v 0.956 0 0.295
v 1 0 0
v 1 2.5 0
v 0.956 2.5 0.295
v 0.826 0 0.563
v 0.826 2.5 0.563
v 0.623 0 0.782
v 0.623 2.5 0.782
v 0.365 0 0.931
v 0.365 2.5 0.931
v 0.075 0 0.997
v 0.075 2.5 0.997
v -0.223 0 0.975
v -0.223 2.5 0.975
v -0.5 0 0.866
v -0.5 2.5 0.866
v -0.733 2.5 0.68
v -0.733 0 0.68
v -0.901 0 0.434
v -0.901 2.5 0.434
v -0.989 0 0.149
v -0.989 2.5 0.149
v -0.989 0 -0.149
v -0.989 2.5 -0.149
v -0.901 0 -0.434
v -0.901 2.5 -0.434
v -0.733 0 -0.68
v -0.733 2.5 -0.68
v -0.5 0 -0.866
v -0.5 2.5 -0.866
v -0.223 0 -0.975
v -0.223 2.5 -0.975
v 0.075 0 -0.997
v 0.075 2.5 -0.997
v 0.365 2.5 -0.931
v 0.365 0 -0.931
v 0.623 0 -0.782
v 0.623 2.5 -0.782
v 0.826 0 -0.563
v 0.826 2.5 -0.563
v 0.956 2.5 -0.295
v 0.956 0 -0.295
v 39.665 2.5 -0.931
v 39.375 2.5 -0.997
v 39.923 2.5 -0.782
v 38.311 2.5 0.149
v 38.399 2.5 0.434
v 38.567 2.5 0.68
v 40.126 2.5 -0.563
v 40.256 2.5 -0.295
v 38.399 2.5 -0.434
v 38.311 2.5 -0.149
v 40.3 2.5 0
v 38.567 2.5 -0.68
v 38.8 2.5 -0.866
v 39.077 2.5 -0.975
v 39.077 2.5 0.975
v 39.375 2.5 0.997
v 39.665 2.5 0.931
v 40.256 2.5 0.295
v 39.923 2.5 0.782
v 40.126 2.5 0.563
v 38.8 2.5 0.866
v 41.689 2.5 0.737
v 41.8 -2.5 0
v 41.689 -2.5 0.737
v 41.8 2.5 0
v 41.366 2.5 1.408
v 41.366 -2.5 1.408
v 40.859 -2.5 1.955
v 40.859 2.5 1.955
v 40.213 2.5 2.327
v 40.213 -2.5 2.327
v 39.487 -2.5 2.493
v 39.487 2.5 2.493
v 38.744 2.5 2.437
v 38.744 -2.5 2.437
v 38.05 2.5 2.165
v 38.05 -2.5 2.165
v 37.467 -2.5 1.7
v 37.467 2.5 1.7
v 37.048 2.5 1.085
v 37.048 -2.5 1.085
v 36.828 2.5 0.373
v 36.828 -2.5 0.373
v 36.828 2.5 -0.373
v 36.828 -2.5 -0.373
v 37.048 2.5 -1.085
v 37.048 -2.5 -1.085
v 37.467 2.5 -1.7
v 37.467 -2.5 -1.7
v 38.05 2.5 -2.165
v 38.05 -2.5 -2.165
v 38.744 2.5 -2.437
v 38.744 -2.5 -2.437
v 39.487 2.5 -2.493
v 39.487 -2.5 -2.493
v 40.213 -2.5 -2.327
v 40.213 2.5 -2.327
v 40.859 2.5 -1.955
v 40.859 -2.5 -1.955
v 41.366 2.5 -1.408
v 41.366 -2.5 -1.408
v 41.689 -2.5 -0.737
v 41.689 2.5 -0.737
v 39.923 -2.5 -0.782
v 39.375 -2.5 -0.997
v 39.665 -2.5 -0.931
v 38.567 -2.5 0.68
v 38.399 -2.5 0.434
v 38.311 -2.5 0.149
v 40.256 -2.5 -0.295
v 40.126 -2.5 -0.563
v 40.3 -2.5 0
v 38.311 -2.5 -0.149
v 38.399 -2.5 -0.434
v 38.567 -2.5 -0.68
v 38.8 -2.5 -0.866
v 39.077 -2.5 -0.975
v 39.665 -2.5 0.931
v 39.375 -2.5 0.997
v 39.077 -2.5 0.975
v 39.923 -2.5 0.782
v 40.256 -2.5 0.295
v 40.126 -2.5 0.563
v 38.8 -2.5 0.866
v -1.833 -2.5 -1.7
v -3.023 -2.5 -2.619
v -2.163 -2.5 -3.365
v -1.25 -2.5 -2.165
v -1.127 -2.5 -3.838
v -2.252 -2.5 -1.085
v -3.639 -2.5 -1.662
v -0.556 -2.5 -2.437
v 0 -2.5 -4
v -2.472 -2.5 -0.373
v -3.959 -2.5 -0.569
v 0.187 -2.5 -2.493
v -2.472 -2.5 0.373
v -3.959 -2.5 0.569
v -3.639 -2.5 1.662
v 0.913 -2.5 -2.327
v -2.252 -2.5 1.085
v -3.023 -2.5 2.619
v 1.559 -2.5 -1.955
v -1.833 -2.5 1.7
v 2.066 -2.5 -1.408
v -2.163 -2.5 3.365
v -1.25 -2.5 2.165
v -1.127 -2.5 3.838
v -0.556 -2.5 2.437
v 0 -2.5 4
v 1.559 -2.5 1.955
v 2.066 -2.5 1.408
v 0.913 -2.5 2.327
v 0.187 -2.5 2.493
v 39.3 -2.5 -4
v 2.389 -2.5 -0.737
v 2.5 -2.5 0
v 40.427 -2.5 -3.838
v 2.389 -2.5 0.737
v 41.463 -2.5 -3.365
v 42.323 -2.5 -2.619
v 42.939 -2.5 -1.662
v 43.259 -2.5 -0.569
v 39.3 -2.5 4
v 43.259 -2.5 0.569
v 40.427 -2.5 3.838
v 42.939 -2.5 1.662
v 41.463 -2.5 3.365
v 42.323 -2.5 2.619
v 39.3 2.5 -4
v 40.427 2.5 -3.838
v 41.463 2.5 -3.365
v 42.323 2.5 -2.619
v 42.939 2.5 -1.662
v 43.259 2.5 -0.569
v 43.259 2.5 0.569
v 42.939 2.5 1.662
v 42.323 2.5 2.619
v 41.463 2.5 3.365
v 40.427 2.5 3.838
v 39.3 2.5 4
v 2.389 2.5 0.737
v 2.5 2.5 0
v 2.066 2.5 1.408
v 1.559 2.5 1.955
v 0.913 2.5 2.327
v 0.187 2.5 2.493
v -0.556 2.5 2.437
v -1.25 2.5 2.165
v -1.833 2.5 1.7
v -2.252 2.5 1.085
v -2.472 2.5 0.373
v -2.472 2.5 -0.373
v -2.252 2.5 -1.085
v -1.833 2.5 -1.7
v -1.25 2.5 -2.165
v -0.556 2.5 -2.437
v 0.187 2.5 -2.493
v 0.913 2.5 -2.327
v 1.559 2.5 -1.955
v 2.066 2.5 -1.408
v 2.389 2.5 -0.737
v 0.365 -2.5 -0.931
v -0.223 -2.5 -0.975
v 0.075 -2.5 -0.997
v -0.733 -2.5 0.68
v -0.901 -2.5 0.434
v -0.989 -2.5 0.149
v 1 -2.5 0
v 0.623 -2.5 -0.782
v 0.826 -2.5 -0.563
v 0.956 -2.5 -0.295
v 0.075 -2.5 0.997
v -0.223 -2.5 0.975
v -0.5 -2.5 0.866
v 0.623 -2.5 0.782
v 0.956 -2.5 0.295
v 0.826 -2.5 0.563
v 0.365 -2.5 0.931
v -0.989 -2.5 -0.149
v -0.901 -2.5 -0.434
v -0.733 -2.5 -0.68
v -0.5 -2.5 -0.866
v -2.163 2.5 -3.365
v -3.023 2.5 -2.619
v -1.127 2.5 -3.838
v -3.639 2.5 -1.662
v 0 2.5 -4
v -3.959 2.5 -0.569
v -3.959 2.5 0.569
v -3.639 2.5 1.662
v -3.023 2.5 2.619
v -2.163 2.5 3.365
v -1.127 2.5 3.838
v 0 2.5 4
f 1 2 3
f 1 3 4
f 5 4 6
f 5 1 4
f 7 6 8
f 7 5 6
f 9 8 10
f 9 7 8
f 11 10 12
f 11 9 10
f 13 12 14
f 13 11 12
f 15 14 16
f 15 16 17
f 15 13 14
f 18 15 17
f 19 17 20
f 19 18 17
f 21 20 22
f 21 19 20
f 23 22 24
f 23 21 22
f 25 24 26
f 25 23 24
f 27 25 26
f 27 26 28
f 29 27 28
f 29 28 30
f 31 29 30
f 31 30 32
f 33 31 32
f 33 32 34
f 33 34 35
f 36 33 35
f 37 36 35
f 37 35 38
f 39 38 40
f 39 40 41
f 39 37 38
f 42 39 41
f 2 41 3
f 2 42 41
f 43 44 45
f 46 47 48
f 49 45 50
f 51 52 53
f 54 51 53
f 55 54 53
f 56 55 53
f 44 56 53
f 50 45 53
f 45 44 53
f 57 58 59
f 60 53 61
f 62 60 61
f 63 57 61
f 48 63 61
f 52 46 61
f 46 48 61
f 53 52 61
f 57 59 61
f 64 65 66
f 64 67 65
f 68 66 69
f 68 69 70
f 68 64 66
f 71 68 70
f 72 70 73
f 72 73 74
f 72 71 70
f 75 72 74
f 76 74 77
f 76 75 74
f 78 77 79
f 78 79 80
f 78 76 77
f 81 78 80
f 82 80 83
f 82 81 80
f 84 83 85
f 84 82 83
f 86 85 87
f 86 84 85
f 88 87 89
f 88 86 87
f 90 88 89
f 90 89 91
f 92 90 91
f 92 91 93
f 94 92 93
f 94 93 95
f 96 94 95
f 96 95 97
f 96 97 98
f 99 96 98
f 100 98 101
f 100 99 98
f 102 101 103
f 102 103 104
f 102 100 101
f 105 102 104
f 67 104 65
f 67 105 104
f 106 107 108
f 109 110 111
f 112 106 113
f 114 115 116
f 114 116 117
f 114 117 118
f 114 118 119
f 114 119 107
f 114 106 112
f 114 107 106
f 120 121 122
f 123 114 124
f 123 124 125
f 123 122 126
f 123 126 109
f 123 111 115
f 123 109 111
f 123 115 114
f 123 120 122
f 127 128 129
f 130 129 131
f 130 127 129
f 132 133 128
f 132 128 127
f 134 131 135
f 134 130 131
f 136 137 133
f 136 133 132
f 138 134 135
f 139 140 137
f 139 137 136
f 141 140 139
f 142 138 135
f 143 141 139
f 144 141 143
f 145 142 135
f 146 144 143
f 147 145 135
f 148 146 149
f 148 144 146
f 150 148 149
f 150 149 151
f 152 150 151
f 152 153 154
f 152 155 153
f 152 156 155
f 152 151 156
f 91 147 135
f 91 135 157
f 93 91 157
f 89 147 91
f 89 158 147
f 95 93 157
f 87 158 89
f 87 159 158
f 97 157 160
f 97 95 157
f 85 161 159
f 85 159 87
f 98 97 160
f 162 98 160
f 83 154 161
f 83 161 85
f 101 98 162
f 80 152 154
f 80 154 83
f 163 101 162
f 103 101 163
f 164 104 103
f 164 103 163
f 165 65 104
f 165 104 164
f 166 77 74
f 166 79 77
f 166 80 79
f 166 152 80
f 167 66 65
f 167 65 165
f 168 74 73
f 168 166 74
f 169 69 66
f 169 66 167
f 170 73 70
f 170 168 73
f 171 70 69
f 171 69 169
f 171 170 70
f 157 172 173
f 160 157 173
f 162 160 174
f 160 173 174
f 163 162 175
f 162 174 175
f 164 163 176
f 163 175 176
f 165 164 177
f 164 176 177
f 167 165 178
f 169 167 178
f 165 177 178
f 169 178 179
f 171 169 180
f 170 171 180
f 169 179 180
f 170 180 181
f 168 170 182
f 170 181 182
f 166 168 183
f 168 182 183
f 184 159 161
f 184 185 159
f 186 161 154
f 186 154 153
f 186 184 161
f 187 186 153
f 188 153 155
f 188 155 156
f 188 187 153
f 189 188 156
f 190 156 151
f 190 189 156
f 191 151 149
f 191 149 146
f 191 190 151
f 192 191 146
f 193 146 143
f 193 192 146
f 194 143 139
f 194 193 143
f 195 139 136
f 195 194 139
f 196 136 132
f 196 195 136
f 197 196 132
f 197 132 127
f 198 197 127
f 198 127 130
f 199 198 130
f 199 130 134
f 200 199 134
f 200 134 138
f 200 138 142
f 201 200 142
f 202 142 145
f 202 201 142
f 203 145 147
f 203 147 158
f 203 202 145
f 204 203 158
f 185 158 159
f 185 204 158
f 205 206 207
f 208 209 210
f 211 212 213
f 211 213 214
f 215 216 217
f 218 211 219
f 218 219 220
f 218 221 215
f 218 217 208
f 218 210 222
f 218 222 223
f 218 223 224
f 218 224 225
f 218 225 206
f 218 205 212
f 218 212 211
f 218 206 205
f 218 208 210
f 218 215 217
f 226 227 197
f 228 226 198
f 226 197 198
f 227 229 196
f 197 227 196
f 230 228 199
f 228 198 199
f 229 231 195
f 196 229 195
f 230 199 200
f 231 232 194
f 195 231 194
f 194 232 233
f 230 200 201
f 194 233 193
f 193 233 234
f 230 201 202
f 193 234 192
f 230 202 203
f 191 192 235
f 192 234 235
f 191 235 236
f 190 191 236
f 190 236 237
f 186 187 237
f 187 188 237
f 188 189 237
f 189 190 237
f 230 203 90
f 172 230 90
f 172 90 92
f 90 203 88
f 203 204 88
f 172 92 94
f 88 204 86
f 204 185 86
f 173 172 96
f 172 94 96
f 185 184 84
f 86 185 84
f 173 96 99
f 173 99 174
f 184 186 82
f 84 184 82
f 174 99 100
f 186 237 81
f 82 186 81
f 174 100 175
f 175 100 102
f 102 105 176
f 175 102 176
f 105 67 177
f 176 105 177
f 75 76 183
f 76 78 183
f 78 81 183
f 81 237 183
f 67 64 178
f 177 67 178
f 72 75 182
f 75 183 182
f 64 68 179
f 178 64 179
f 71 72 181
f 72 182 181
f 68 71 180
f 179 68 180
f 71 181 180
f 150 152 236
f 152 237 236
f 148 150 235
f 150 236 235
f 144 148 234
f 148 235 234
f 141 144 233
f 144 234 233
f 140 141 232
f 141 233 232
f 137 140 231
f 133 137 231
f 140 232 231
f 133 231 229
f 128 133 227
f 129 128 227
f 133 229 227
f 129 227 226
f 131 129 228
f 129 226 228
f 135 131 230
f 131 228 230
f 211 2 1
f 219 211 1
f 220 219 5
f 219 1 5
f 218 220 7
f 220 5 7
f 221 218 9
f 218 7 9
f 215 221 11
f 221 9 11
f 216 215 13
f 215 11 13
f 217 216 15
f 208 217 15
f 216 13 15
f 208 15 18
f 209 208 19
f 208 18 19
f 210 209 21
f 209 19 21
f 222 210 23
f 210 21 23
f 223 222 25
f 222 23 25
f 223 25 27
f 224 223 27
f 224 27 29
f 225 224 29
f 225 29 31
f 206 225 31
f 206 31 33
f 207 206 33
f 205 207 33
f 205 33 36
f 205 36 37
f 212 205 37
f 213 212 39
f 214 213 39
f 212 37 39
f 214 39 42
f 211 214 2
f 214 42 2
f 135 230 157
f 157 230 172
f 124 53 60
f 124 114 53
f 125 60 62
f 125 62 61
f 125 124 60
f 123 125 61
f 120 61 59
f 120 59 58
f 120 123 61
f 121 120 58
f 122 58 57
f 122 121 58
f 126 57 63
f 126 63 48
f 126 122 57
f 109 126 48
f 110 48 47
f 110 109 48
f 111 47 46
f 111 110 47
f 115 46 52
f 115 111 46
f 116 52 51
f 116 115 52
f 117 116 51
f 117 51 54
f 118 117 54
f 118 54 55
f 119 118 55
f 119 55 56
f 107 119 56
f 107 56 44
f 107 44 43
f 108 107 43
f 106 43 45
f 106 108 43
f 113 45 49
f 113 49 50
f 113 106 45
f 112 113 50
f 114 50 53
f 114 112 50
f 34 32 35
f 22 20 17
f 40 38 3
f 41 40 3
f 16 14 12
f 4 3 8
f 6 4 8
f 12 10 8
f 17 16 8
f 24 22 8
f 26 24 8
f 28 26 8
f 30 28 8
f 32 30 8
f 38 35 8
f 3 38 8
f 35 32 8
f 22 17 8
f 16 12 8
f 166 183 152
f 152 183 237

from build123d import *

# Parameters (mm, degrees)
F0_R     = 2.5
F0_R_2   = 1
F1_DEPTH = 2.5


with BuildPart() as f1:
    # F0 (on Front) → F1 (new body, symmetric)
    with BuildSketch(Plane.XZ):
        with BuildLine():
            Line((39.3, 4), (0, 4))
            ThreePointArc((0, 4), (-4, 0), (0, -4))
            Line((0, -4), (39.3, -4))
            ThreePointArc((39.3, -4), (43.3, 0), (39.3, 4))
        make_face()
        Circle(F0_R, mode=Mode.SUBTRACT)
        with Locations((39.3, 0)):
            Circle(F0_R, mode=Mode.SUBTRACT)
        Circle(F0_R_2)
        with Locations((39.3, 0)):
            Circle(F0_R_2)
    extrude(amount=F1_DEPTH, both=True)


solid = f1.part
